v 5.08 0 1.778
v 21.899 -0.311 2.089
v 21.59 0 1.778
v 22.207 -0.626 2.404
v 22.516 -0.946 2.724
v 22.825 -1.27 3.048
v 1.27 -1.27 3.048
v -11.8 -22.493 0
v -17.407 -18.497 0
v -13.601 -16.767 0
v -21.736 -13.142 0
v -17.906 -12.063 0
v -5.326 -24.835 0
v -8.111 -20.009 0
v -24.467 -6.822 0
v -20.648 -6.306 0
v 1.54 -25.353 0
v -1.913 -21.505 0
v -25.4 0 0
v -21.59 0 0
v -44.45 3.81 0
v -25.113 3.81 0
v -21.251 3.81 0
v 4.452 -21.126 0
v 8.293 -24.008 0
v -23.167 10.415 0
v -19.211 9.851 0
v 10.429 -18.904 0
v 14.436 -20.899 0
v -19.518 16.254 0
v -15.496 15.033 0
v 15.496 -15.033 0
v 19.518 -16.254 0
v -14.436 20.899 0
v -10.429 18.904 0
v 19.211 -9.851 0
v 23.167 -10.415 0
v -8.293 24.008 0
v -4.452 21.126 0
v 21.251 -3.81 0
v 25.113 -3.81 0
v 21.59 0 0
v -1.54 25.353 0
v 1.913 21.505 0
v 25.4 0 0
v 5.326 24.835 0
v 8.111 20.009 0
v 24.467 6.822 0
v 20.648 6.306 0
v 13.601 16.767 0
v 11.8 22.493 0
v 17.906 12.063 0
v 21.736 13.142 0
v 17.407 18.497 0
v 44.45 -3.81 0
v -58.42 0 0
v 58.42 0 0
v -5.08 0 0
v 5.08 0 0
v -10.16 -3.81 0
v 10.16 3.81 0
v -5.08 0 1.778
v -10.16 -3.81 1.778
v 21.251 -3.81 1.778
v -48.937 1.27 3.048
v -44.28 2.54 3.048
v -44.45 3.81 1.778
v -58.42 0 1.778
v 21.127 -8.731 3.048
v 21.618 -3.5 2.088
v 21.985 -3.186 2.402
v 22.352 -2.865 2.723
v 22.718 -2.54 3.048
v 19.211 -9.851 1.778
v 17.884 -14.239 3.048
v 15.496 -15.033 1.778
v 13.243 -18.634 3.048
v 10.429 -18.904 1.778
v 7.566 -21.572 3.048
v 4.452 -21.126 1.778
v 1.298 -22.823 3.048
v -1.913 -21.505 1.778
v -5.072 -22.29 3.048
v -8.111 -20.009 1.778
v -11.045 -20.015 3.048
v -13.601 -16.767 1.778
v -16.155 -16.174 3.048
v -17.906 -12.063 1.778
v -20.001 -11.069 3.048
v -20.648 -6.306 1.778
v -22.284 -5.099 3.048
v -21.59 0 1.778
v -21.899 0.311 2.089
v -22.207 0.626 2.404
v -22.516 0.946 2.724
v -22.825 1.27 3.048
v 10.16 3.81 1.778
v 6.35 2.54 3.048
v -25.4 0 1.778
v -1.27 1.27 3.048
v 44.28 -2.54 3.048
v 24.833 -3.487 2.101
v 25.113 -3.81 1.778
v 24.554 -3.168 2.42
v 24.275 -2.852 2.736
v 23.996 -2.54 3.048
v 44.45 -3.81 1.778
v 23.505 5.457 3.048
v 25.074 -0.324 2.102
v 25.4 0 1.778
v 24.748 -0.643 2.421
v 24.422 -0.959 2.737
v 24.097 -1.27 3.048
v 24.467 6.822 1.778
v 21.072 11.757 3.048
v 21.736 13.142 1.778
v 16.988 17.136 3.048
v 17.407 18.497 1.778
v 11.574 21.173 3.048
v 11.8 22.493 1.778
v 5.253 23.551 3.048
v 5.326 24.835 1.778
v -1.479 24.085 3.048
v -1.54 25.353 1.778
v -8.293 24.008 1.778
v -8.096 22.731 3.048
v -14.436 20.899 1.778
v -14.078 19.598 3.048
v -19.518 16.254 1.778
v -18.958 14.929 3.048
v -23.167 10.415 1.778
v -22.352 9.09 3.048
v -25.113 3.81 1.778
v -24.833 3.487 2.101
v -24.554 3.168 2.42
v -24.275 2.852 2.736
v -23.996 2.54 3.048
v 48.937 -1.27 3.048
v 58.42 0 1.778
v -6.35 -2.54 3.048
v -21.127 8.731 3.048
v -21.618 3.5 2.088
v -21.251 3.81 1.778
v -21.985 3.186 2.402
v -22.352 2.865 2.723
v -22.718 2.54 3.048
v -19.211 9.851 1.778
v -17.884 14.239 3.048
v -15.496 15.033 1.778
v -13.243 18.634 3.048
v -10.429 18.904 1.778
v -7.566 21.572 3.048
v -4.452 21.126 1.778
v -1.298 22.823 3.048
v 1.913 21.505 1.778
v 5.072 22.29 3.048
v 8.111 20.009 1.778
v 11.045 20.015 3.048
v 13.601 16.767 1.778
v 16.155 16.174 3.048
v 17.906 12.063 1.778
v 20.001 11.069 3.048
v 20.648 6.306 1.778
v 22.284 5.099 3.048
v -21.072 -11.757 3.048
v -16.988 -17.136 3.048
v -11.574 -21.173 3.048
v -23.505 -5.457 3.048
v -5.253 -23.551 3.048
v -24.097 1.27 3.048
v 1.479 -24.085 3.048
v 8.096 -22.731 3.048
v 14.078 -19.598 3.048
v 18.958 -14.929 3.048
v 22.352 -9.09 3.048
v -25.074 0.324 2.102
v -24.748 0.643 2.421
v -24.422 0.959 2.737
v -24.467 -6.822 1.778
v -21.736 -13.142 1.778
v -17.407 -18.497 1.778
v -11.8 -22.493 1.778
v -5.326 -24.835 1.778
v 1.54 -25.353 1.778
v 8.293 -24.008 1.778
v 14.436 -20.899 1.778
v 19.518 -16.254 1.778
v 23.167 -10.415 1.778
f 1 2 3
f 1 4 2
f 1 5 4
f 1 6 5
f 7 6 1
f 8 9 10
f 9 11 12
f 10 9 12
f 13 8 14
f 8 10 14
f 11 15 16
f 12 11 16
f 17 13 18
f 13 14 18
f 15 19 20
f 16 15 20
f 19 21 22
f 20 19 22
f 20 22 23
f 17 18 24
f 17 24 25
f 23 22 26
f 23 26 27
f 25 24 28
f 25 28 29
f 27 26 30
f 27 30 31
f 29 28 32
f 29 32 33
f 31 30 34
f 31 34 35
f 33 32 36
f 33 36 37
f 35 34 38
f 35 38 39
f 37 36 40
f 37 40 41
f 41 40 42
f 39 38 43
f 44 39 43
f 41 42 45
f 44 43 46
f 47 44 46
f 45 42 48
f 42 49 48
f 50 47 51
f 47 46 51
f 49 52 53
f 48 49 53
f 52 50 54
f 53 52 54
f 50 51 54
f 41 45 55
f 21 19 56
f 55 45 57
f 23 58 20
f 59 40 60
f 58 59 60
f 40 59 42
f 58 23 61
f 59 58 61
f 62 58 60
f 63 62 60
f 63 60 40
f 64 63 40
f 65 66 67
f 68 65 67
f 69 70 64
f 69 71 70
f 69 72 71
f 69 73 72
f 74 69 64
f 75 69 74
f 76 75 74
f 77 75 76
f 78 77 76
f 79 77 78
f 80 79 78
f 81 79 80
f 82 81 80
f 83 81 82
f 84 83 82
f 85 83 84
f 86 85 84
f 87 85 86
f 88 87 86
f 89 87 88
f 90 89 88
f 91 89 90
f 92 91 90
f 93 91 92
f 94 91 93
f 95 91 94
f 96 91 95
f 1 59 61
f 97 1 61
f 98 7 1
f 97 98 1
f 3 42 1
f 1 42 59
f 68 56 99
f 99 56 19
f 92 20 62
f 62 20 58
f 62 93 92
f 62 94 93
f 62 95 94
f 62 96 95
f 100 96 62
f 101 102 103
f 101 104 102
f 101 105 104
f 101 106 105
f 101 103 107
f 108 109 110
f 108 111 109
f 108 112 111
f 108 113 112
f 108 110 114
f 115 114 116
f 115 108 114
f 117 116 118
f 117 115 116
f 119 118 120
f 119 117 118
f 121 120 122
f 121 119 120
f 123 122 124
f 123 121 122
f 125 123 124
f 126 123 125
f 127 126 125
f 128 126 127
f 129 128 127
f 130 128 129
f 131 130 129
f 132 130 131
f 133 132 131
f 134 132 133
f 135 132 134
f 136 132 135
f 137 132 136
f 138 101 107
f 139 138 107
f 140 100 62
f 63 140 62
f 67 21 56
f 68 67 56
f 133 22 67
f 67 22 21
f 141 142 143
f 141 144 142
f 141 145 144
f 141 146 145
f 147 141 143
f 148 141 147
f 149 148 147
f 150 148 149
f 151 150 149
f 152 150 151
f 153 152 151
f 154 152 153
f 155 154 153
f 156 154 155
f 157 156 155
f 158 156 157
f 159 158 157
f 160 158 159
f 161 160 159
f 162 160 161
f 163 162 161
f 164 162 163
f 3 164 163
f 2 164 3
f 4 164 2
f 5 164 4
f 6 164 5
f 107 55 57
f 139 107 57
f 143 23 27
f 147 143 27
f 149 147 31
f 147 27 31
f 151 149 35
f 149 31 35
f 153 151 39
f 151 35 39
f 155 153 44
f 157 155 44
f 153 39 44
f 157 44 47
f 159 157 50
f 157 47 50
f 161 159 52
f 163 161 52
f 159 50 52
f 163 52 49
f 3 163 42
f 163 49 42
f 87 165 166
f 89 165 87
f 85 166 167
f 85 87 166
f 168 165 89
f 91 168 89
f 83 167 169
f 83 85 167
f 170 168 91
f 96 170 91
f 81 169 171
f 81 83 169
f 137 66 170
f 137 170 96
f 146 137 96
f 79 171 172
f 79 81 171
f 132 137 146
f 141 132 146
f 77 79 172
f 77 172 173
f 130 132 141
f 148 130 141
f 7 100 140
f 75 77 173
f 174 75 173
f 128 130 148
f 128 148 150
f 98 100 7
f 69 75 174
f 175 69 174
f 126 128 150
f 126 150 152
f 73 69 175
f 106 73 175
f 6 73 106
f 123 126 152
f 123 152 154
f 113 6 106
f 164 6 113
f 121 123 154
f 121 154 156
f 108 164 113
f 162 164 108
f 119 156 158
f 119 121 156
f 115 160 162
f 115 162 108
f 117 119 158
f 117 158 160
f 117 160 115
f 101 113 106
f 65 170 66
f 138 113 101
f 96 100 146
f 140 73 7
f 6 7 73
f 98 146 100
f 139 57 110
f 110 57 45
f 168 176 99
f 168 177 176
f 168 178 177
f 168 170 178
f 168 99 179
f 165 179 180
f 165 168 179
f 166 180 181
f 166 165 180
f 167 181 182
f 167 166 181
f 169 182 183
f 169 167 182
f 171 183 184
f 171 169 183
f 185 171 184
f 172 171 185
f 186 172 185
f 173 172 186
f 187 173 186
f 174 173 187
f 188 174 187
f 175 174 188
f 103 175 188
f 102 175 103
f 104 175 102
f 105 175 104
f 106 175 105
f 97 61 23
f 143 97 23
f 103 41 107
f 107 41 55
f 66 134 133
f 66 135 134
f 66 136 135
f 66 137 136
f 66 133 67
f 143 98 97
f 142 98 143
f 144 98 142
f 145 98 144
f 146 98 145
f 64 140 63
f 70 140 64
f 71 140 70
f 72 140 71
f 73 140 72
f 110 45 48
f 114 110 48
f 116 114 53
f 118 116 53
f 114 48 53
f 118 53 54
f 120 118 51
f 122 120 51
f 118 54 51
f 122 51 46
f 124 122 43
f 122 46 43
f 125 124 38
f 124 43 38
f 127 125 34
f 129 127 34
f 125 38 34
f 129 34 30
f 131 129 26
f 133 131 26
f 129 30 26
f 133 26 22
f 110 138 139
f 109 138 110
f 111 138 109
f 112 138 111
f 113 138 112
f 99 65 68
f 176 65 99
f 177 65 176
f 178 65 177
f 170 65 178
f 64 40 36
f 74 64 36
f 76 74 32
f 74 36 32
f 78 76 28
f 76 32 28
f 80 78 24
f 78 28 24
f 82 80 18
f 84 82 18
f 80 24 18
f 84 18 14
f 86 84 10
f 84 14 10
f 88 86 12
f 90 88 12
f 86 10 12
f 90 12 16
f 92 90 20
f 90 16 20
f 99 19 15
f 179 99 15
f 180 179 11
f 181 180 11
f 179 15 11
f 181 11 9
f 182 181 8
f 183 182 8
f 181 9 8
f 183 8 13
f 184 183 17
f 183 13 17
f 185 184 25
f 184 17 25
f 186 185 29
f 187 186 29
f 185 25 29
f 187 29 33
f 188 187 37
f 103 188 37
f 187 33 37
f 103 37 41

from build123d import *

# Parameters (mm, degrees)
F1_DEPTH = 3.048
F2_SIZE  = 1.27


with BuildPart() as f1:
    # F0 (on Top) → F1 (new body)
    with BuildSketch(Plane.XY):
        with BuildLine():
            Line((-25.112624, 3.81), (-44.45, 3.81))
            Line((-44.45, 3.81), (-58.42, 0))
            Line((-58.42, 0), (-25.4, 0))
            ThreePointArc((-25.4, 0), (-1.910411, -25.328054), (25.112624, -3.81))
            Line((25.112624, -3.81), (44.45, -3.81))
            Line((44.45, -3.81), (58.42, 0))
            Line((58.42, 0), (25.4, 0))
            ThreePointArc((25.4, 0), (1.910411, 25.328054), (-25.112624, 3.81))
        make_face()
        with BuildLine():
            Line((-5.08, 0), (-10.16, -3.81))
            Line((-10.16, -3.81), (21.251165, -3.81))
            ThreePointArc((21.251165, -3.81), (-1.912519, -21.505124), (-21.59, 0))
            Line((-21.59, 0), (-5.08, 0))
        make_face(mode=Mode.SUBTRACT)
        with BuildLine():
            Line((5.08, 0), (10.16, 3.81))
            Line((10.16, 3.81), (-21.251165, 3.81))
            ThreePointArc((-21.251165, 3.81), (1.912519, 21.505124), (21.59, 0))
            Line((21.59, 0), (5.08, 0))
        make_face(mode=Mode.SUBTRACT)
    extrude(amount=F1_DEPTH)

    # F2
    f2_edges = [f1.edges().sort_by_distance(p)[0] for p in [
        (-51.435, 1.905, 3.048),
        (-34.781312, 3.81, 3.048),
        (-41.91, 0, 3.048),
        (-1.910411, -25.328054, 3.048),
        (-1.912519, -21.505124, 3.048),
        (5.545582, -3.81, 3.048),
        (13.335, 0, 3.048),
        (7.62, 1.905, 3.048),
        (-5.545582, 3.81, 3.048),
        (-13.335, 0, 3.048),
        (-7.62, -1.905, 3.048),
        (1.912519, 21.505124, 3.048),
        (1.910411, 25.328054, 3.048),
        (41.91, 0, 3.048),
        (34.781312, -3.81, 3.048),
        (51.435, -1.905, 3.048),
    ]]
    chamfer(f2_edges, length=F2_SIZE)


solid = f1.part
